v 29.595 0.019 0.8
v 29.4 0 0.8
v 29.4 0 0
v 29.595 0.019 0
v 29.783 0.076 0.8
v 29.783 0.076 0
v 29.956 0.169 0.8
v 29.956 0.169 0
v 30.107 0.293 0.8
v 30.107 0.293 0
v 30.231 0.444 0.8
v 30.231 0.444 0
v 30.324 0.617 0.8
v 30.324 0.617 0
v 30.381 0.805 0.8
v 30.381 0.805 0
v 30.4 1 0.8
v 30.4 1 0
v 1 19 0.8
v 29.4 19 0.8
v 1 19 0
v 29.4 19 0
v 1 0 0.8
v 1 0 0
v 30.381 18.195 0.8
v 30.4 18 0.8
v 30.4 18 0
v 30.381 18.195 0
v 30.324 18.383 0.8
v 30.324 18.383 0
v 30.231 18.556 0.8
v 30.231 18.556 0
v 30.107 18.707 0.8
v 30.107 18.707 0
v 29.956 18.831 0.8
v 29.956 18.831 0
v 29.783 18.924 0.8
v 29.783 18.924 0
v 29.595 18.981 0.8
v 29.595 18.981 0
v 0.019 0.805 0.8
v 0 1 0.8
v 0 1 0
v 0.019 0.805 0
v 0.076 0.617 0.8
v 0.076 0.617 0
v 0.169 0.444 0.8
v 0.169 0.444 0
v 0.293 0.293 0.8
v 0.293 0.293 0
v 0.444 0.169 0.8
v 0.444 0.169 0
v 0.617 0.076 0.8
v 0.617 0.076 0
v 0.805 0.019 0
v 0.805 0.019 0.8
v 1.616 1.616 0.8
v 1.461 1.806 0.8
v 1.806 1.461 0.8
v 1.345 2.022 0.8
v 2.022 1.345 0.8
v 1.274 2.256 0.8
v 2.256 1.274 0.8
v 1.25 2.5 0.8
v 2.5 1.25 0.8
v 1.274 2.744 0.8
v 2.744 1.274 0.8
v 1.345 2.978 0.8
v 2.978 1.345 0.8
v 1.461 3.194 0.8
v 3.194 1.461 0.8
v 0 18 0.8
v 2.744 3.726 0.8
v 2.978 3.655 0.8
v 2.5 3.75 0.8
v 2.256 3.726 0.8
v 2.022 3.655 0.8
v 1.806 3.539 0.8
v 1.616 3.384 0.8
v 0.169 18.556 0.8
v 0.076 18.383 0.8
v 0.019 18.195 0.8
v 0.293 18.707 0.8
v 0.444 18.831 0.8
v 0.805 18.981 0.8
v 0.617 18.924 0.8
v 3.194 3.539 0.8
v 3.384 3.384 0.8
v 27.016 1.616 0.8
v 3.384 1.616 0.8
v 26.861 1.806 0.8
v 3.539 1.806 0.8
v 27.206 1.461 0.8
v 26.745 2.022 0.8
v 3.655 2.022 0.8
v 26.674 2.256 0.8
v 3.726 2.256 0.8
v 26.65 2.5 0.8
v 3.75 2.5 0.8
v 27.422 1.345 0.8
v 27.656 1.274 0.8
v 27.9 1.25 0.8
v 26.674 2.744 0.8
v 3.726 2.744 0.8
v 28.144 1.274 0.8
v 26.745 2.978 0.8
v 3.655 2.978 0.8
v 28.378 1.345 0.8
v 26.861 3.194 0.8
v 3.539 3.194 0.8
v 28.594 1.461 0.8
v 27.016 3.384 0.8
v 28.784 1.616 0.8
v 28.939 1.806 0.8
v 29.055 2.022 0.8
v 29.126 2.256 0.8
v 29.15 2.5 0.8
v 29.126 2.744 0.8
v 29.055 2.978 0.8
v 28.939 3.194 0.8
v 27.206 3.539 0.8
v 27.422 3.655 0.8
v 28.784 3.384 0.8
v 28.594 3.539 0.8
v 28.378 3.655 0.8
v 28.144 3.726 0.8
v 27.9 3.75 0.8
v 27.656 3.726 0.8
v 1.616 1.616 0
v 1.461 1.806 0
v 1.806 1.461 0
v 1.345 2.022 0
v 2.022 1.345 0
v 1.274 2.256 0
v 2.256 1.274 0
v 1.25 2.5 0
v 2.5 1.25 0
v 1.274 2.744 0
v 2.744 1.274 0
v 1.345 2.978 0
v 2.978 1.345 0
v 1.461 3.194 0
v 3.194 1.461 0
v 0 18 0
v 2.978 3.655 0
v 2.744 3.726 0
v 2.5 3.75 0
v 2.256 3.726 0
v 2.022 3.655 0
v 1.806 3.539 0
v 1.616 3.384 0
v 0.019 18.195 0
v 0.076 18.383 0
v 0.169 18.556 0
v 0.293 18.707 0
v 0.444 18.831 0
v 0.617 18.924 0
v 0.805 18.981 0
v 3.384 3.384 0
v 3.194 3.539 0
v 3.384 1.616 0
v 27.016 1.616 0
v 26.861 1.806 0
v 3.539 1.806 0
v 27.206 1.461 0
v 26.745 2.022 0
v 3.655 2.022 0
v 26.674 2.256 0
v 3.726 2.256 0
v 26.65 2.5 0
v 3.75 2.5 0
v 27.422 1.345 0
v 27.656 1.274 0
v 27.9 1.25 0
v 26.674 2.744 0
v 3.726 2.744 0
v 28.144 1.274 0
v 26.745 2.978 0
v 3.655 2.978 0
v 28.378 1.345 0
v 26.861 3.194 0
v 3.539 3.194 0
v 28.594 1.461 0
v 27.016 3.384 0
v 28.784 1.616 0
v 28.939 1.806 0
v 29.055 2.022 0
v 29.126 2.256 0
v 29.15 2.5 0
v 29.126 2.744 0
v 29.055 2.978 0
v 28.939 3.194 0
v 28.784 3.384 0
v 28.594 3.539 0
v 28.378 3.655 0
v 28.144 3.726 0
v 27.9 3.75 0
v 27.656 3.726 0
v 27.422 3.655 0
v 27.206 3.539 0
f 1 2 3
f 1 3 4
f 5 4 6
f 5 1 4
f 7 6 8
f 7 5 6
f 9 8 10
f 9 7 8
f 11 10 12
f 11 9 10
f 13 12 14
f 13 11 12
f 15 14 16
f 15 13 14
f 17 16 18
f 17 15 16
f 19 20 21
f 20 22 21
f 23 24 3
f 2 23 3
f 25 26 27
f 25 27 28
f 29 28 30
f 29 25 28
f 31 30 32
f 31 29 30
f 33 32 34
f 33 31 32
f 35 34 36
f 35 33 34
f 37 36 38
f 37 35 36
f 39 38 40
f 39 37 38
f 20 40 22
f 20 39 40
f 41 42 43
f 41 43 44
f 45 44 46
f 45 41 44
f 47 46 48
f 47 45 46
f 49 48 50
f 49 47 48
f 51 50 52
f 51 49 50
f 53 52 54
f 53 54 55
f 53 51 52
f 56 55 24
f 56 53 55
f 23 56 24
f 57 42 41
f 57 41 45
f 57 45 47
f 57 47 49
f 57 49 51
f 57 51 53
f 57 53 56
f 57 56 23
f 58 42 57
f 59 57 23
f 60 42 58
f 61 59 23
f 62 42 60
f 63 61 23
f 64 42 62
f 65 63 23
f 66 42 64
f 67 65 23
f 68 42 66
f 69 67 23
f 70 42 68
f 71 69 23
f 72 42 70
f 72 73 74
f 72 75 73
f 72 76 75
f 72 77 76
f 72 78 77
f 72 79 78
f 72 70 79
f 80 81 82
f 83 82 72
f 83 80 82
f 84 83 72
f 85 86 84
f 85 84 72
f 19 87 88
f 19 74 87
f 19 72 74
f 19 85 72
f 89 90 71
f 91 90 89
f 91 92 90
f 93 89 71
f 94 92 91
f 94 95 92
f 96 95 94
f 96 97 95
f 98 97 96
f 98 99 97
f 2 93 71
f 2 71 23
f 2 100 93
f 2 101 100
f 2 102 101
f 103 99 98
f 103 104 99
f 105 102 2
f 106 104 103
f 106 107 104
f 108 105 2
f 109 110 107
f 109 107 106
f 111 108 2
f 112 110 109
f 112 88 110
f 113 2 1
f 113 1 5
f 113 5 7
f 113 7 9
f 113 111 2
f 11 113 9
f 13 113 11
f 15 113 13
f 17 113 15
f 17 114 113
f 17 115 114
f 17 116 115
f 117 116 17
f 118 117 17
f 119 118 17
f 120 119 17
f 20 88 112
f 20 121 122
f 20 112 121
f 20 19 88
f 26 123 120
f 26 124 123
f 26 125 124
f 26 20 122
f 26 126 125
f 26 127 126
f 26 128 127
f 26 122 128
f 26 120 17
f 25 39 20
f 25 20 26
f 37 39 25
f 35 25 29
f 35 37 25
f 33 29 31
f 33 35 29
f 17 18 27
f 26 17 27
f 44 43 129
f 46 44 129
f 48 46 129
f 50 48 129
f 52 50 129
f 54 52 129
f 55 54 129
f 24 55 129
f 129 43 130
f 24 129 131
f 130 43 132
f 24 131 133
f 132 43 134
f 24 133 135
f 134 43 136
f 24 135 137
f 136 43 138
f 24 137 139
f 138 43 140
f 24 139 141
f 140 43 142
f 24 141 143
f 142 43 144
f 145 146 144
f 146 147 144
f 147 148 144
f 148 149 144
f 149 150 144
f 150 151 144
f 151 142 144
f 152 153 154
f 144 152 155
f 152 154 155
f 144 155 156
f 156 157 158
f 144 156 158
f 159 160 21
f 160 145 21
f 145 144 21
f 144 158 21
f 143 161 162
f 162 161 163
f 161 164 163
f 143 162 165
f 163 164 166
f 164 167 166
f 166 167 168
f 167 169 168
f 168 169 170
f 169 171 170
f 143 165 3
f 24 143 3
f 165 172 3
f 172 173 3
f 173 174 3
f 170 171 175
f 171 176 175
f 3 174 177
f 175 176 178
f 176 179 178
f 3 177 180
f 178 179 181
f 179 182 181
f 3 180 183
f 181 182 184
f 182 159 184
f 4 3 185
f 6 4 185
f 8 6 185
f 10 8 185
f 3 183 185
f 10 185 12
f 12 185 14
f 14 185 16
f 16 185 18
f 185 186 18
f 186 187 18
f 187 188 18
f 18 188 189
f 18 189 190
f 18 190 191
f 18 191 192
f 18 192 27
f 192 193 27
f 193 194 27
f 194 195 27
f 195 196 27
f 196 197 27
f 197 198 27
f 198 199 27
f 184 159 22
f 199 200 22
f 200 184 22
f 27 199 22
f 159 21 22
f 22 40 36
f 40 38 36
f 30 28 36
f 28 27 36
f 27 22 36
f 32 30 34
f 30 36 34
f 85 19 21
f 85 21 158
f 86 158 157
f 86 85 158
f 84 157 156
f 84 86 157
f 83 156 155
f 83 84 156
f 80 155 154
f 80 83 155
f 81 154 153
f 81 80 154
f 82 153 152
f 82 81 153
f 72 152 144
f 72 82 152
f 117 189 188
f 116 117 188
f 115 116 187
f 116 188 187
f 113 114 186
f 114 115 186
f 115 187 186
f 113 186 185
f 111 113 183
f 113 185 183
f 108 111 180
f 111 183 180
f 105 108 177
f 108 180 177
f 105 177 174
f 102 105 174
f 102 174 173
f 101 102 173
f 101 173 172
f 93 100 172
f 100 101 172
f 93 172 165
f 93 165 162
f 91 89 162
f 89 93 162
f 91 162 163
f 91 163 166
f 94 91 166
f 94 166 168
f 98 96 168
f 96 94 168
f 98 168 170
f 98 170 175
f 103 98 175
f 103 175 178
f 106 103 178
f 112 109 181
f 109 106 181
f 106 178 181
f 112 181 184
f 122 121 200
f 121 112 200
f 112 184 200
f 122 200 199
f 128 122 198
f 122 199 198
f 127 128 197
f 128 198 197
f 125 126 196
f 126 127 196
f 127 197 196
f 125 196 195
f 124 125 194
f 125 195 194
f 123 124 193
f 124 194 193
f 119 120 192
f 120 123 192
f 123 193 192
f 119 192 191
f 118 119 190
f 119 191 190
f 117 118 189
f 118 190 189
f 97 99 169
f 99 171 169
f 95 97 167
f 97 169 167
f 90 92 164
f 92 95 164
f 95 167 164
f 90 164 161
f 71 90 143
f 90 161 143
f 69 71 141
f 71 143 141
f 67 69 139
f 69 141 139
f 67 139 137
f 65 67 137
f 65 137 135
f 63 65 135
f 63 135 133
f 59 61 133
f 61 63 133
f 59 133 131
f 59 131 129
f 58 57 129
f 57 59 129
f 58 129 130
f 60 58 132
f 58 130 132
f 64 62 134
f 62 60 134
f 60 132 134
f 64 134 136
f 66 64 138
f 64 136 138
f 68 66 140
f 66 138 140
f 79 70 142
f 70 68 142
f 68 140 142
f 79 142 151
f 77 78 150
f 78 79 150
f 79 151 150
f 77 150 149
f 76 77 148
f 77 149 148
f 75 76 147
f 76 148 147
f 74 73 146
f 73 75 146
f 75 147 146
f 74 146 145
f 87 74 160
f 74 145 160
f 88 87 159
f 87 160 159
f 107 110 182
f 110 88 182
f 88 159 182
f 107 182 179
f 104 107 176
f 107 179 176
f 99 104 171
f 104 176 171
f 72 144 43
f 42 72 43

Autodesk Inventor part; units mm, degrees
ref_plane "YZ Plane" through (0, 0, 0) normal (1, 0, 0) x (0, 1, 0)
ref_plane "XZ Plane" through (0, 0, 0) normal (0, 1, 0) x (-1, 0, 0)
ref_plane "XY Plane" through (0, 0, 0) normal (0, 0, 1) x (1, 0, 0)
sketch "Sketch1" plane through (0, 0, 0) normal (0, 0, 1) x (1, 0, 0)
  line L0 (0, 0) -> (30.4, 0)
  line L1 (30.4, 0) -> (30.4, 19)
  line L2 (30.4, 19) -> (0, 19)
  line L3 (0, 19) -> (0, 0)
  circle A0 centre (2.5, 2.5) radius 2.5
  circle A1 centre (27.9, 2.5) radius 2.5
  circle A2 centre (2.5, 2.5) radius 1.25
  circle A3 centre (27.9, 2.5) radius 1.25
  dimension "d0" = 30.4
  dimension "d1" = 19
  dimension "d2" = 5
  dimension "d3" = 5
  dimension "d6" = 2.5
  dimension "d7" = 2.5
extrude "Extrusion1" add sketch "Sketch1" along normal blind 0.8
fillet "Fillet1" radius 1 4 edges at (30.4, 0, 0.4) (0, 0, 0.4) (0, 19, 0.4) (30.4, 19, 0.4)
equation "\"d3\" = d2"
properties part number "PCB_Main"
